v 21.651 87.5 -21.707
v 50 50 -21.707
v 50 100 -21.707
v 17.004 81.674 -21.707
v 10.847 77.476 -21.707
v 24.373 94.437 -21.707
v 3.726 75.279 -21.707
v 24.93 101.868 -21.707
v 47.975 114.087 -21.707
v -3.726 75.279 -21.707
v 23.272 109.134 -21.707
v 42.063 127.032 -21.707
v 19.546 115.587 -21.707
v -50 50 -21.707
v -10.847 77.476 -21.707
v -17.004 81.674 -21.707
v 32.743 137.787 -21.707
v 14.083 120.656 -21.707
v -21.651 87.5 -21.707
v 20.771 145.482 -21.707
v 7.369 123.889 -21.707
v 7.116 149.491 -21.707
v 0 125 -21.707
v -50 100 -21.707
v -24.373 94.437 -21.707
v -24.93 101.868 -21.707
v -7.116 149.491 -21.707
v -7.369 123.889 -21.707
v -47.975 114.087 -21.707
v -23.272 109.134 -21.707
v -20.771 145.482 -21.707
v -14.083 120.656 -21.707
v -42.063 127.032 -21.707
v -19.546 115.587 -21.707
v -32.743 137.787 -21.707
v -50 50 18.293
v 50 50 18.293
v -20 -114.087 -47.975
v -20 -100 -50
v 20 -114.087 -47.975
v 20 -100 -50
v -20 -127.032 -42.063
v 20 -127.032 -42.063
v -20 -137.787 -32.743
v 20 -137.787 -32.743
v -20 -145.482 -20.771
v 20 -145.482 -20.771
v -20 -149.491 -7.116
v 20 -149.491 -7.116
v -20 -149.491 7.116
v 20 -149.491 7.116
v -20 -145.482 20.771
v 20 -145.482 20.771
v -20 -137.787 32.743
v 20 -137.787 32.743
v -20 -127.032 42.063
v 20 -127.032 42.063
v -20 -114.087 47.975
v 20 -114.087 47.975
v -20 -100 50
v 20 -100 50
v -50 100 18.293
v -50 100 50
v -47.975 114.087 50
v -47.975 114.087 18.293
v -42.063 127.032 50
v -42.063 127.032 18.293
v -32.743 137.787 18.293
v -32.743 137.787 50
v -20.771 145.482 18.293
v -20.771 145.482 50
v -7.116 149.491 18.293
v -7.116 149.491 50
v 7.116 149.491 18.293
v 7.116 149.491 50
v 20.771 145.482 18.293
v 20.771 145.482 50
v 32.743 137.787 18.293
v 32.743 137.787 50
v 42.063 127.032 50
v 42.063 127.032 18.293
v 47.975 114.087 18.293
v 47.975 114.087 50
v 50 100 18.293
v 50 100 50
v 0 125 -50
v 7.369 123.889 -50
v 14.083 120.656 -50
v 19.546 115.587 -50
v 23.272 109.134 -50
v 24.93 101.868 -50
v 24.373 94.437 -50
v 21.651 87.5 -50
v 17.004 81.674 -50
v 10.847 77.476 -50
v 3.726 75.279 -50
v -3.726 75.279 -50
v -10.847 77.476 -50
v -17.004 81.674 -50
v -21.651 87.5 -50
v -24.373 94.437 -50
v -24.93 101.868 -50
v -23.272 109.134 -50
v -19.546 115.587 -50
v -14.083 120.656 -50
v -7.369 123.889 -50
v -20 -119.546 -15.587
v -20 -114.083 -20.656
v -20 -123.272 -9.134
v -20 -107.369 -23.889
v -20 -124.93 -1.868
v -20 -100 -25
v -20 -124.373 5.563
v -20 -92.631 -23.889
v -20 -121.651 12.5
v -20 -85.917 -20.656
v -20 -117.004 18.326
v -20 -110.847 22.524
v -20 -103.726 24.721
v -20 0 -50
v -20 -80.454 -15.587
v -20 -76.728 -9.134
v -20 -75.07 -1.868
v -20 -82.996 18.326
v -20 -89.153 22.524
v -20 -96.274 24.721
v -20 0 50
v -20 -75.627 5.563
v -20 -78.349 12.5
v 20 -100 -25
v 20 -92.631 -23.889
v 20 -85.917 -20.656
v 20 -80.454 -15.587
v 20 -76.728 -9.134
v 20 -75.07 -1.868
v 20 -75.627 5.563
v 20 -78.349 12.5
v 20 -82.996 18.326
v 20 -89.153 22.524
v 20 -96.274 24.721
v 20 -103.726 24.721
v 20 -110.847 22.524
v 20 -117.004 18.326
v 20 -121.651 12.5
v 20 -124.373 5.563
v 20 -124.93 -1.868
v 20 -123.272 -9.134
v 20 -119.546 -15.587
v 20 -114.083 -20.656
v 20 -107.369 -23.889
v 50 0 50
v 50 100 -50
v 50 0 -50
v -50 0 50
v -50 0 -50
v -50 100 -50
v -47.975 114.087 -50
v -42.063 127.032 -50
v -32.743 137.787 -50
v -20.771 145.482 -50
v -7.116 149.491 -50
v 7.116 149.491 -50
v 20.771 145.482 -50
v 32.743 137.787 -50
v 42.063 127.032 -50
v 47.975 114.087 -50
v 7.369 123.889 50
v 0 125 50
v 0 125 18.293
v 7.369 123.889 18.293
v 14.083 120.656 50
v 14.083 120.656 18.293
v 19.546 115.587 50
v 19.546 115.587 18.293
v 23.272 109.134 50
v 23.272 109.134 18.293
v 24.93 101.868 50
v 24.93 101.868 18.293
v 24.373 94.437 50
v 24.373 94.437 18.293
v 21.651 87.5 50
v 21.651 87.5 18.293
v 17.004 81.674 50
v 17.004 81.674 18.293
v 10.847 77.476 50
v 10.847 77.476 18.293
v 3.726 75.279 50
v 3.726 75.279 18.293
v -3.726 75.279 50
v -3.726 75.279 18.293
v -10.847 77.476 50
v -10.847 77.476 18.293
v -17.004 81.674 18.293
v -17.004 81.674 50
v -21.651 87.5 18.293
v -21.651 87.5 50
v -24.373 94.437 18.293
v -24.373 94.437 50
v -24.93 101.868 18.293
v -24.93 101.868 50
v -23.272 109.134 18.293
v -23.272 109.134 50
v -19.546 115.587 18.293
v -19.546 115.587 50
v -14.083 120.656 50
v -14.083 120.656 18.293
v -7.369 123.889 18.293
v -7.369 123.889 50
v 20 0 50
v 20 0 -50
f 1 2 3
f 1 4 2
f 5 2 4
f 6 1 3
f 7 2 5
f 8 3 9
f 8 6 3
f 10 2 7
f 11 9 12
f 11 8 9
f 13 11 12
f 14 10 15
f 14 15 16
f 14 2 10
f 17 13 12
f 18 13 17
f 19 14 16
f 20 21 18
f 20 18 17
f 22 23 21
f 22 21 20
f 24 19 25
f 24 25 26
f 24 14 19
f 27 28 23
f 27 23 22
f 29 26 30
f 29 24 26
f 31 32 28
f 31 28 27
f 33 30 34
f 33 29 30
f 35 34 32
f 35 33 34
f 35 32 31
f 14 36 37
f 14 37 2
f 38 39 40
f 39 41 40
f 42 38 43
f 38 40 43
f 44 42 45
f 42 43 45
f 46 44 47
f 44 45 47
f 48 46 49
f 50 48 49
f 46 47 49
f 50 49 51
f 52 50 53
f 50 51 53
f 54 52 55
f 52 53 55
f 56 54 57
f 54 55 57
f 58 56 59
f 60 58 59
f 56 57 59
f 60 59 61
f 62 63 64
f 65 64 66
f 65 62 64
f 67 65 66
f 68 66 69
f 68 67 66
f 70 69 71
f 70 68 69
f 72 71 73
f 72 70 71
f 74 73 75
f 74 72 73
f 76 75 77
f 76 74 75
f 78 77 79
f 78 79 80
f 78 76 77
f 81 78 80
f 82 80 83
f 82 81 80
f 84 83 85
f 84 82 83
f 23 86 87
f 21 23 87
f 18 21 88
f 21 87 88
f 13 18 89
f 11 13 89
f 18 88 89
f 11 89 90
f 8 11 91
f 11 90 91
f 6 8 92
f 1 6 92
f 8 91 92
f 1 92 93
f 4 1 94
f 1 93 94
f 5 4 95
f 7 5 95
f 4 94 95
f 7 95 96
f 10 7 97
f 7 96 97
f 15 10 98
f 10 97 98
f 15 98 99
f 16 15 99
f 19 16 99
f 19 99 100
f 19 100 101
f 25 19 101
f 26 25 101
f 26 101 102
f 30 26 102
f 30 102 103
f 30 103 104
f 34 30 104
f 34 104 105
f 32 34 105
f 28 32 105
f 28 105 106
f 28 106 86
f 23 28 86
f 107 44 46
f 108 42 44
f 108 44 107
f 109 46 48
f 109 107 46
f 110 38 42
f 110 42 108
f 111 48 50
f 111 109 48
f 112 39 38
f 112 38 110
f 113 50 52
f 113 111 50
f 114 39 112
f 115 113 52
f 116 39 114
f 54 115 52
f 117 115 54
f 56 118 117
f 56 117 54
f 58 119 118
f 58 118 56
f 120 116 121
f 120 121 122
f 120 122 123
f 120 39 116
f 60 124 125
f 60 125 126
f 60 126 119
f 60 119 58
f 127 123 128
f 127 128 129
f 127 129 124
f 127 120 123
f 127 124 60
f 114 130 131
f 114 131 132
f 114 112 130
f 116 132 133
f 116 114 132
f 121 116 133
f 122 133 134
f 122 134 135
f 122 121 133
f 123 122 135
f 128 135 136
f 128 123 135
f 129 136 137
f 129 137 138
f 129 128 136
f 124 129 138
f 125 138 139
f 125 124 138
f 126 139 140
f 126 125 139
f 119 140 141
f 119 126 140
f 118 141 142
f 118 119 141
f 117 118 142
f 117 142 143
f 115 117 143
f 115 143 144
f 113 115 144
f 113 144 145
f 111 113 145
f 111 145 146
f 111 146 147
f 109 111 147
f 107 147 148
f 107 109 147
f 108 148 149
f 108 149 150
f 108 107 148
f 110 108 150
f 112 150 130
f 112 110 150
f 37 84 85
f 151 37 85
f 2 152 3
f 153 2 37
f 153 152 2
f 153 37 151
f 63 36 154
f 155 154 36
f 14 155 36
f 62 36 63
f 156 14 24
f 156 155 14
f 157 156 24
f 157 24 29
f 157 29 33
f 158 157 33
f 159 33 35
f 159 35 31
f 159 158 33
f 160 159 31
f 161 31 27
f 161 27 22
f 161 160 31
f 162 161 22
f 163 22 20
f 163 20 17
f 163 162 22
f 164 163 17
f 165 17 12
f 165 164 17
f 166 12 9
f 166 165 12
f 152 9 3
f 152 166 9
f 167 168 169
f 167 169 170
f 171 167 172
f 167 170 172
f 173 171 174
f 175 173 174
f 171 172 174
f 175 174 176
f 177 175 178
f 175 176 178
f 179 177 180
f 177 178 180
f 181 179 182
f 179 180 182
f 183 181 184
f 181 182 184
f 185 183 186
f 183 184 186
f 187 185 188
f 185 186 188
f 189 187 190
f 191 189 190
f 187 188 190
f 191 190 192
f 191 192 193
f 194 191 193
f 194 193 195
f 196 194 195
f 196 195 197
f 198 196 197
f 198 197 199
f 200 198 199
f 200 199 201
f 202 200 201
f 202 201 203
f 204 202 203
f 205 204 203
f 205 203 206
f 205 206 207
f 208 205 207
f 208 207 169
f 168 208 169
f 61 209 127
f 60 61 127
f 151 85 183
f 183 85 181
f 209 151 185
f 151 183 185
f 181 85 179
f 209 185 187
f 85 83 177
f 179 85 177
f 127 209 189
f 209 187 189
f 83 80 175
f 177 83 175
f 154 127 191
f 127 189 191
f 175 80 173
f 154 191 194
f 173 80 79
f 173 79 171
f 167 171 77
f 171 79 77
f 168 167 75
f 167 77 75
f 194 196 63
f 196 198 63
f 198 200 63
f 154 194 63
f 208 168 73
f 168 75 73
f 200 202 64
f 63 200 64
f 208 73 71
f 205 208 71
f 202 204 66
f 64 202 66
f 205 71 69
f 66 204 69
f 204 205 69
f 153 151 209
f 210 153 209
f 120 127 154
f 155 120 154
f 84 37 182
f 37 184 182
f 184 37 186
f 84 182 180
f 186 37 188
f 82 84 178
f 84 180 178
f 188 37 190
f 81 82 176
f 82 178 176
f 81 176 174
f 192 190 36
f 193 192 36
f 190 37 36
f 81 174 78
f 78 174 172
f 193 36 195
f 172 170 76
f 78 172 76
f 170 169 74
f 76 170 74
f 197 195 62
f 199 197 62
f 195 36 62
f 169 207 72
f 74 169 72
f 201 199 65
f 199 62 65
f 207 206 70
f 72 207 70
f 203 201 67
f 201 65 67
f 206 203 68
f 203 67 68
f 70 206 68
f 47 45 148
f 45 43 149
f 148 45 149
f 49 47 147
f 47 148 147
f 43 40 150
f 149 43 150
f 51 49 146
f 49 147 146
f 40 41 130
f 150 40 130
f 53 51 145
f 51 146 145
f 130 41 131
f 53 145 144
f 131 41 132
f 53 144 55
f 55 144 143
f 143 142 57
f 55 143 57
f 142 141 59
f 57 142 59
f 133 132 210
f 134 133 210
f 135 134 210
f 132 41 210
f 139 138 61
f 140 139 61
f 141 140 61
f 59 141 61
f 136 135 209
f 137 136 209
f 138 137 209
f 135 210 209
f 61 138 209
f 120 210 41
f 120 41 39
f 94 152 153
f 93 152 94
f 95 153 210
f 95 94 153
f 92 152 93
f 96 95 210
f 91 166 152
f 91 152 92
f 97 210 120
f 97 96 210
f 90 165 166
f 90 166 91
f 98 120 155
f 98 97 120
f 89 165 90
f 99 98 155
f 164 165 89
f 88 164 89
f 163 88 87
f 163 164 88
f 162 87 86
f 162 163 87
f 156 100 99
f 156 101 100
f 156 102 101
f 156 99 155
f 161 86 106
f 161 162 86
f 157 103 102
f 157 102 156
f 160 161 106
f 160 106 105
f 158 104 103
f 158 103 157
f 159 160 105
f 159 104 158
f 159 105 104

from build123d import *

# Parameters (mm, degrees)
SKETCH2_R               = 25
BOSS_EXTRUDE1_DEPTH     = 20
SKETCH3_R               = 25
BOSS_EXTRUDE2_DEPTH     = 100
CUT_EXTRUDE1_DEPTH      = 188.082869339
CUT_EXTRUDE1_DEPTH_BACK = 188.082869339
SKETCH4_W               = 40
SKETCH4_H               = 100


with BuildPart() as part:
    # Sketch2 → Boss-Extrude1 (new, symmetric)
    with BuildSketch(Plane(origin=(0, 0, 0), x_dir=(0, 0, -1), z_dir=(1, 0, 0))):
        with BuildLine():
            Line((-50, 0), (50, 0))
            Line((50, 0), (50, -100))
            ThreePointArc((50, -100), (0, -150), (-50, -100))
            Line((-50, -100), (-50, 0))
        make_face()
        with Locations((0, -100)):
            Circle(SKETCH2_R, mode=Mode.SUBTRACT)
    extrude(amount=BOSS_EXTRUDE1_DEPTH, both=True)

    # Sketch3 → Boss-Extrude2 (add)
    with BuildSketch(Plane(origin=(0, 0, -50), x_dir=(-1, 0, 0), z_dir=(0, 0, -1))):
        with BuildLine():
            Line((-50, 0), (50, 0))
            Line((50, 0), (50, 100))
            ThreePointArc((50, 100), (0, 150), (-50, 100))
            Line((-50, 100), (-50, 0))
        make_face()
        with Locations(Location((0, 100, 0), (0, 0, 90))):
            Circle(SKETCH3_R, mode=Mode.SUBTRACT)
    extrude(amount=-BOSS_EXTRUDE2_DEPTH)

    # Sketch4 → Cut-Extrude1 (cut, two sides: drawn at the far end of the back side and taken through both)
    with BuildSketch(Plane(origin=(50, 0, 0), x_dir=(0, 0, -1), z_dir=(1, 0, 0)).offset(-CUT_EXTRUDE1_DEPTH_BACK)):
        with Locations((1.706579079, 100)):
            Rectangle(SKETCH4_W, SKETCH4_H)
    extrude(amount=CUT_EXTRUDE1_DEPTH + CUT_EXTRUDE1_DEPTH_BACK, mode=Mode.SUBTRACT)


solid = part.part
